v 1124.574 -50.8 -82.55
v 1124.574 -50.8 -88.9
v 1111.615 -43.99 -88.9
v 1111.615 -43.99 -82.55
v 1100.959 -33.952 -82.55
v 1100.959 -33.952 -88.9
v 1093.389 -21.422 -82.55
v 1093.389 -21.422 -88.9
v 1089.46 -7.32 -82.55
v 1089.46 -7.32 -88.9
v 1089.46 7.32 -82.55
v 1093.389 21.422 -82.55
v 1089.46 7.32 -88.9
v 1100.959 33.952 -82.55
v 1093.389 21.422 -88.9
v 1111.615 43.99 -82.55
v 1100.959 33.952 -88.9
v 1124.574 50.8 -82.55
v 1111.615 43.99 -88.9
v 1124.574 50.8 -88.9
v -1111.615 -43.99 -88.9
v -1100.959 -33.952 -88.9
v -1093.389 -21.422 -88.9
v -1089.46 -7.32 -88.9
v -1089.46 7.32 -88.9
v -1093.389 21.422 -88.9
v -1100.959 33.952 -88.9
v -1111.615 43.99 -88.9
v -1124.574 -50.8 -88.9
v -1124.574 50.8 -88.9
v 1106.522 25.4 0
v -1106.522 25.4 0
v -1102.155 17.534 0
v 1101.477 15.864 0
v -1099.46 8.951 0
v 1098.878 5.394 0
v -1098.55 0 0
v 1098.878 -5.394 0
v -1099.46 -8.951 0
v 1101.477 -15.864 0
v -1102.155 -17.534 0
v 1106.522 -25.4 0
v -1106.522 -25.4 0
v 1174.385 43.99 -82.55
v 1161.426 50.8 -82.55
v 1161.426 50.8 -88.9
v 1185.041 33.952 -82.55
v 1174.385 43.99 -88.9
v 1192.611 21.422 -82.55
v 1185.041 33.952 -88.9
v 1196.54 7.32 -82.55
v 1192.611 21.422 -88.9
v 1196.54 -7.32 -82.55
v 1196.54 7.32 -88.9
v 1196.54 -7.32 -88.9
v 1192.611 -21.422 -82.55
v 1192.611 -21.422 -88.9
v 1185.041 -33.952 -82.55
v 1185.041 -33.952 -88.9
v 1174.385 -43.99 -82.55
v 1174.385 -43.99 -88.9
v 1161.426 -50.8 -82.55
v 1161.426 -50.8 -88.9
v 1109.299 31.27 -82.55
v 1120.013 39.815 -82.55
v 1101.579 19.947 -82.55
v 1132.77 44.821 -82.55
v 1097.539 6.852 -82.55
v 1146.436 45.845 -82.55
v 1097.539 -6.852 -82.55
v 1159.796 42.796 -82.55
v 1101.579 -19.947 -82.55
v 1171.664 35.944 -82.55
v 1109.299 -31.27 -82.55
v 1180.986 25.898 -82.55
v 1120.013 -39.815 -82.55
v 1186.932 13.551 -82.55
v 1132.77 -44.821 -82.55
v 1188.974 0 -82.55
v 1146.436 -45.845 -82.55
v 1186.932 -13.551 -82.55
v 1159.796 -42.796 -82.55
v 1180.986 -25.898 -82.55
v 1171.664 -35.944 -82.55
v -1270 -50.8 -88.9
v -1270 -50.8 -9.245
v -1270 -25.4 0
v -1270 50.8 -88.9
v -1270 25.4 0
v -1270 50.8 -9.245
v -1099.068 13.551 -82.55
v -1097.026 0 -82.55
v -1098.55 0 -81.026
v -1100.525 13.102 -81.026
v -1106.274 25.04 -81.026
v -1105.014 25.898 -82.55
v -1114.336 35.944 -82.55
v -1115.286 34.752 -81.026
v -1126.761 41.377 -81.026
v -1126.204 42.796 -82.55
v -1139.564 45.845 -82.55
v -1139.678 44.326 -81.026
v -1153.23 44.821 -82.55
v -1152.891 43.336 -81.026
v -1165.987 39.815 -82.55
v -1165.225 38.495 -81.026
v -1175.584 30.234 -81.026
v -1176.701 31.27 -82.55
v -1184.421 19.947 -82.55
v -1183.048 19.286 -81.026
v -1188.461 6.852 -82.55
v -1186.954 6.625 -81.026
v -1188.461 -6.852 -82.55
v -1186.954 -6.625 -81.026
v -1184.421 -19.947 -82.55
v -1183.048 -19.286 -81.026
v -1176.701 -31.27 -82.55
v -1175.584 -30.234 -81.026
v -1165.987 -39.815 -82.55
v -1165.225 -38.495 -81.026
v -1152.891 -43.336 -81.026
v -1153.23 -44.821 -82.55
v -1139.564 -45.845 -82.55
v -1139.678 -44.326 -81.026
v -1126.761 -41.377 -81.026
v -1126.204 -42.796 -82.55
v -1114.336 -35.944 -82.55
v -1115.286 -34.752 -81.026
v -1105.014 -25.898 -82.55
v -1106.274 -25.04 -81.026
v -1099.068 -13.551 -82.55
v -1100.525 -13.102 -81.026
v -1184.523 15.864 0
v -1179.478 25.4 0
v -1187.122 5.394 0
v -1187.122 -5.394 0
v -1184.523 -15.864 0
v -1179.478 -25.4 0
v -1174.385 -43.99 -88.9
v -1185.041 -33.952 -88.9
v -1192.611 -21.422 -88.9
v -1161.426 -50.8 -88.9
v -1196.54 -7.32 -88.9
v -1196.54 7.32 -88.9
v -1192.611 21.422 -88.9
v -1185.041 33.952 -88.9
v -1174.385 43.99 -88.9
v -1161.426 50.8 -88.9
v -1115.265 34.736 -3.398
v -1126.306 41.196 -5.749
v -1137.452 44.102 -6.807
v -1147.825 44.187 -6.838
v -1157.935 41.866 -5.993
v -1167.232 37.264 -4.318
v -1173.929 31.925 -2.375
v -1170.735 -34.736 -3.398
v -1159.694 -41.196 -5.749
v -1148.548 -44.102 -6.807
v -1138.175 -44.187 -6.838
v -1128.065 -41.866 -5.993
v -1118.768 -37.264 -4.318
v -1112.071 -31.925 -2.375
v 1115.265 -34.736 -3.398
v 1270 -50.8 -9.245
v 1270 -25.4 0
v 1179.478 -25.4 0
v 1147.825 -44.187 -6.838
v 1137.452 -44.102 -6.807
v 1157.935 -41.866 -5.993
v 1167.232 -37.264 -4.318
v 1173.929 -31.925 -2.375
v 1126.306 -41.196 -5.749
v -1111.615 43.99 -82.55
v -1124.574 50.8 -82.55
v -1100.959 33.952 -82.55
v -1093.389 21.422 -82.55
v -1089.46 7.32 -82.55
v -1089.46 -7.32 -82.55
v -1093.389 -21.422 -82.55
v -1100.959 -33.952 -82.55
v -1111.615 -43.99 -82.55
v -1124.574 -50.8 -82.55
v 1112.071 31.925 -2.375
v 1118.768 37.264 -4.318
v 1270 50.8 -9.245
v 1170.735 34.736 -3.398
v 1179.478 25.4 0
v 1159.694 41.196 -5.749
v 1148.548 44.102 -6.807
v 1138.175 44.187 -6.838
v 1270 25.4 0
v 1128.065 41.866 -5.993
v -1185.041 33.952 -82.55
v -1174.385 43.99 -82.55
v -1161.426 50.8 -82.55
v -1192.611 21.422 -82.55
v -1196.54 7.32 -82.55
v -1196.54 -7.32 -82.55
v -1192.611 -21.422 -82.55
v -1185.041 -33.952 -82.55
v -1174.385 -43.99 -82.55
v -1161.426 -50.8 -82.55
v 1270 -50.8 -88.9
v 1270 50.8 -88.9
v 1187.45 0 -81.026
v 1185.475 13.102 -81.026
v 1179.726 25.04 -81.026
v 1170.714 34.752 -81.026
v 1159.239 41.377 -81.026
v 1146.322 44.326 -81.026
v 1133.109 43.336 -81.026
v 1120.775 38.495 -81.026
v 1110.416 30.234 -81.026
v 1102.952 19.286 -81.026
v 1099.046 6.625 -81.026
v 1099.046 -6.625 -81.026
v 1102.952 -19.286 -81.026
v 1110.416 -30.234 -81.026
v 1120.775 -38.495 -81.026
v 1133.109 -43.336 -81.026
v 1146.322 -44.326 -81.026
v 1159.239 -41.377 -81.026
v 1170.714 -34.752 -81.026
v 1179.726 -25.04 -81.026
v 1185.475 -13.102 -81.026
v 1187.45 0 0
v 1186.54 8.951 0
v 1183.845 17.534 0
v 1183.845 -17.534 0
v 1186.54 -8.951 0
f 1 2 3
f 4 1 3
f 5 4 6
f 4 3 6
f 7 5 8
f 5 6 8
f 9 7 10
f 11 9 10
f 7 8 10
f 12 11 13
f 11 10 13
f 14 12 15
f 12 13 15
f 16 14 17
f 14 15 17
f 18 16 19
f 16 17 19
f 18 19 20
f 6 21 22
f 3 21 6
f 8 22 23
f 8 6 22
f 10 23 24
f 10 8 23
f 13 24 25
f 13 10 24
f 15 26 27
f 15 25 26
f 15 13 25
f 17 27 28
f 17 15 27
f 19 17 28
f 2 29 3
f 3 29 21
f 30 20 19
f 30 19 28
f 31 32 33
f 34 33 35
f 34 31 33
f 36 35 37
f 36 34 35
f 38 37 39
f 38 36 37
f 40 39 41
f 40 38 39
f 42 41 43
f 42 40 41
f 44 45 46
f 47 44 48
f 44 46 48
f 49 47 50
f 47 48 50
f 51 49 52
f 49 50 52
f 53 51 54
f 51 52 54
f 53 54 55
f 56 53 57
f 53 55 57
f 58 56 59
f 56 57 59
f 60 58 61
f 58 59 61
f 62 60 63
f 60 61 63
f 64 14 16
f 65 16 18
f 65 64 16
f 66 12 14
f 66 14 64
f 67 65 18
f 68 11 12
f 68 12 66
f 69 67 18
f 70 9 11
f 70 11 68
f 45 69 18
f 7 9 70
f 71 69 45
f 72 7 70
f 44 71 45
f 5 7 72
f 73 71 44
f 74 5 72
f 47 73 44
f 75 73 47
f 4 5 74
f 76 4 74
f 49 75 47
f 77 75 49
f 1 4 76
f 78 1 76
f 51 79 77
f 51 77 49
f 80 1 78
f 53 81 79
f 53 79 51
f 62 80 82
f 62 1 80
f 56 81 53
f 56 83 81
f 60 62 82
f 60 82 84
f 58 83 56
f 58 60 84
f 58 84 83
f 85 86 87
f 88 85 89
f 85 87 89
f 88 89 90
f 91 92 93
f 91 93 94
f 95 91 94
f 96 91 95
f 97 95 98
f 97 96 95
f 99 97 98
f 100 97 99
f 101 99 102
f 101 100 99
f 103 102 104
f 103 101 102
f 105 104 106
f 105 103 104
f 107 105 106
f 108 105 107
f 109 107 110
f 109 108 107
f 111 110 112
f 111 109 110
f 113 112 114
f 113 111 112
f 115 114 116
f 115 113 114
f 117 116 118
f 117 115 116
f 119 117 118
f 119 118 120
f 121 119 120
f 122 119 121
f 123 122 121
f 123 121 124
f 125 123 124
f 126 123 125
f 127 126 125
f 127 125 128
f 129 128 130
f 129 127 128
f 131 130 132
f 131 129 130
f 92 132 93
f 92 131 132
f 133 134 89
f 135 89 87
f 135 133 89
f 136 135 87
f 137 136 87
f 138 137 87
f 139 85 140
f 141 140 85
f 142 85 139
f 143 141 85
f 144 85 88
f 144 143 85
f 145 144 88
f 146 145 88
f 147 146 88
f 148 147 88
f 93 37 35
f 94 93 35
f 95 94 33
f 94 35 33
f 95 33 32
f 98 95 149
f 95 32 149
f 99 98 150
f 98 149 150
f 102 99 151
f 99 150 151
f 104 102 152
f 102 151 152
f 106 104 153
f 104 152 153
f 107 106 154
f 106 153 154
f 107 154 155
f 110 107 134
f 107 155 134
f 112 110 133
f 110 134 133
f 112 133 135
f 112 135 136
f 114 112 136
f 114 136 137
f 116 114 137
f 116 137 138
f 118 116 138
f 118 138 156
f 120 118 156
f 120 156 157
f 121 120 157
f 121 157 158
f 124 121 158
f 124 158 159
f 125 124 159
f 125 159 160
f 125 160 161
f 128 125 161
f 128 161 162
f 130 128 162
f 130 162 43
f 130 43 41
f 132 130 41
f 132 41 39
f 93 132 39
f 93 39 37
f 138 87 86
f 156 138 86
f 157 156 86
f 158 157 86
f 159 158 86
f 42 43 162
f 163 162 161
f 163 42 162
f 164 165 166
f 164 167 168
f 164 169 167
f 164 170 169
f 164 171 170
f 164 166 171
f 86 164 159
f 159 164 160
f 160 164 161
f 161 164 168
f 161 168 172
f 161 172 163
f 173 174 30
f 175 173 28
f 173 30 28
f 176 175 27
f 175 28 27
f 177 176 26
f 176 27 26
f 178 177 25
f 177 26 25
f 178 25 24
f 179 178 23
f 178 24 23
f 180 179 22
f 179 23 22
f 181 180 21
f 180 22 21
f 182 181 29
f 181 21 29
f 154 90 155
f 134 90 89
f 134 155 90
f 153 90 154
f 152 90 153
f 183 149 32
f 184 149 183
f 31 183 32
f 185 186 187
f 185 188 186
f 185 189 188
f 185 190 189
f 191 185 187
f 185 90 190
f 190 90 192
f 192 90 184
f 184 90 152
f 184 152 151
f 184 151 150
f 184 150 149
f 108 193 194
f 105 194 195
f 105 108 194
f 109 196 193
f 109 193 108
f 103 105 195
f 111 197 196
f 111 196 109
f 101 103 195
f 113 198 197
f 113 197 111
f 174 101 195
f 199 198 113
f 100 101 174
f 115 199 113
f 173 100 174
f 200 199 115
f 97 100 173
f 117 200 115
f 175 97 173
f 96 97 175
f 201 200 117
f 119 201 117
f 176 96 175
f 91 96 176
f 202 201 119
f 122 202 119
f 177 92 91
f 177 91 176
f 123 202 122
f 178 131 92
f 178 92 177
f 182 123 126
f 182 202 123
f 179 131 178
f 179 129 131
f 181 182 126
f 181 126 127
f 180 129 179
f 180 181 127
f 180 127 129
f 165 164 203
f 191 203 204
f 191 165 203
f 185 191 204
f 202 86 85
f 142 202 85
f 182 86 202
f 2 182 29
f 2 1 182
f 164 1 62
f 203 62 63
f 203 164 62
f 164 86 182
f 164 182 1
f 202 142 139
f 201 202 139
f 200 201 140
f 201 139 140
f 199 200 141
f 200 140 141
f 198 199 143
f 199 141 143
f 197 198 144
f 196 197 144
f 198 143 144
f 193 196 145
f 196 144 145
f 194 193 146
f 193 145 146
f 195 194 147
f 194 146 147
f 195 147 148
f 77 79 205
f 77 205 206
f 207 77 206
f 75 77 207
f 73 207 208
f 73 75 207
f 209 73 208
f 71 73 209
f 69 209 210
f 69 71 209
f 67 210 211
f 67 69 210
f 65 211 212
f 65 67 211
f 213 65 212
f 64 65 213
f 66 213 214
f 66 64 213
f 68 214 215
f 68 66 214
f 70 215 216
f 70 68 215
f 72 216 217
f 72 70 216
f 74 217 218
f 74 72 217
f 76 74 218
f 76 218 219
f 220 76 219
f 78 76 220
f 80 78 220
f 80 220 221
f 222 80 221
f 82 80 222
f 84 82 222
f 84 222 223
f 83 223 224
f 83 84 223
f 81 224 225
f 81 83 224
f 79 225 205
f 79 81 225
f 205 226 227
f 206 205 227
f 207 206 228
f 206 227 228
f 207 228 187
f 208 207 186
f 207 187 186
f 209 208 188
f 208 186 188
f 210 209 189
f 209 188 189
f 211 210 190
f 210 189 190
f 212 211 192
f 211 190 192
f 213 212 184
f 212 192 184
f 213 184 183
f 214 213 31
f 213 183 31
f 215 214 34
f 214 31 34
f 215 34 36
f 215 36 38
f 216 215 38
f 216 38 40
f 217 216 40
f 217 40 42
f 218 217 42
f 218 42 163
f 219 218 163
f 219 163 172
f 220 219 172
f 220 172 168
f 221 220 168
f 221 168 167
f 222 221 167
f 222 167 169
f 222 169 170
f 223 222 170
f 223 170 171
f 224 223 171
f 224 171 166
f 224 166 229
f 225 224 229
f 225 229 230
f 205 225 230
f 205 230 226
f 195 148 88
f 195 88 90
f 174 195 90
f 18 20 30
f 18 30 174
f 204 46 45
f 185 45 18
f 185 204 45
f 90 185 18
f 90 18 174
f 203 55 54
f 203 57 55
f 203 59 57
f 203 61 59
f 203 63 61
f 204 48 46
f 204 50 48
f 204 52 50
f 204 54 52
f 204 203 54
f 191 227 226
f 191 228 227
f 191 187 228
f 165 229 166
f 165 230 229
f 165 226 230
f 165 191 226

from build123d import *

# Parameters (mm, degrees)
F1_DEPTH = 1270
F2_R     = 44.45
F3_DEPTH = 88.901
F4_R     = 54.0385
F5_DEPTH = 6.35
F6_SIZE  = 1.524
F7_SIZE  = 1.524


with BuildPart() as f1:
    # F0 (on Right) → F1 (new body, symmetric)
    with BuildSketch(Plane.YZ):
        Polygon((25.4, 0), (-25.4, 0), (-50.8, -9.244844), (-50.8, -88.9), (50.8, -88.9), (50.8, -9.244844), align=None)
    extrude(amount=F1_DEPTH, both=True)

    # F2 (on Top) → F3 (cut, through all)
    with BuildSketch(Plane.XY):
        with Locations((1143, 0)):
            Circle(F2_R)
        with Locations((-1143, 0)):
            Circle(F2_R)
    extrude(amount=-F3_DEPTH, mode=Mode.SUBTRACT)

    # F4 (on face) → F5 (cut)
    with BuildSketch(Plane(origin=(0, 0, -88.9), x_dir=(1, 0, 0), z_dir=(0, 0, -1))):
        with Locations((1143, 0)):
            Circle(F4_R)
        with Locations((-1143, 0)):
            Circle(F4_R)
    extrude(amount=-F5_DEPTH, mode=Mode.SUBTRACT)

    # F6
    f6_edges = [f1.edges().sort_by_distance(p)[0] for p in [
        (1098.55, 0, -82.55),
    ]]
    chamfer(f6_edges, length=F6_SIZE)

    # F7
    f7_edges = [f1.edges().sort_by_distance(p)[0] for p in [
        (-1187.45, 0, -82.55),
    ]]
    chamfer(f7_edges, length=F7_SIZE)


solid = f1.part
